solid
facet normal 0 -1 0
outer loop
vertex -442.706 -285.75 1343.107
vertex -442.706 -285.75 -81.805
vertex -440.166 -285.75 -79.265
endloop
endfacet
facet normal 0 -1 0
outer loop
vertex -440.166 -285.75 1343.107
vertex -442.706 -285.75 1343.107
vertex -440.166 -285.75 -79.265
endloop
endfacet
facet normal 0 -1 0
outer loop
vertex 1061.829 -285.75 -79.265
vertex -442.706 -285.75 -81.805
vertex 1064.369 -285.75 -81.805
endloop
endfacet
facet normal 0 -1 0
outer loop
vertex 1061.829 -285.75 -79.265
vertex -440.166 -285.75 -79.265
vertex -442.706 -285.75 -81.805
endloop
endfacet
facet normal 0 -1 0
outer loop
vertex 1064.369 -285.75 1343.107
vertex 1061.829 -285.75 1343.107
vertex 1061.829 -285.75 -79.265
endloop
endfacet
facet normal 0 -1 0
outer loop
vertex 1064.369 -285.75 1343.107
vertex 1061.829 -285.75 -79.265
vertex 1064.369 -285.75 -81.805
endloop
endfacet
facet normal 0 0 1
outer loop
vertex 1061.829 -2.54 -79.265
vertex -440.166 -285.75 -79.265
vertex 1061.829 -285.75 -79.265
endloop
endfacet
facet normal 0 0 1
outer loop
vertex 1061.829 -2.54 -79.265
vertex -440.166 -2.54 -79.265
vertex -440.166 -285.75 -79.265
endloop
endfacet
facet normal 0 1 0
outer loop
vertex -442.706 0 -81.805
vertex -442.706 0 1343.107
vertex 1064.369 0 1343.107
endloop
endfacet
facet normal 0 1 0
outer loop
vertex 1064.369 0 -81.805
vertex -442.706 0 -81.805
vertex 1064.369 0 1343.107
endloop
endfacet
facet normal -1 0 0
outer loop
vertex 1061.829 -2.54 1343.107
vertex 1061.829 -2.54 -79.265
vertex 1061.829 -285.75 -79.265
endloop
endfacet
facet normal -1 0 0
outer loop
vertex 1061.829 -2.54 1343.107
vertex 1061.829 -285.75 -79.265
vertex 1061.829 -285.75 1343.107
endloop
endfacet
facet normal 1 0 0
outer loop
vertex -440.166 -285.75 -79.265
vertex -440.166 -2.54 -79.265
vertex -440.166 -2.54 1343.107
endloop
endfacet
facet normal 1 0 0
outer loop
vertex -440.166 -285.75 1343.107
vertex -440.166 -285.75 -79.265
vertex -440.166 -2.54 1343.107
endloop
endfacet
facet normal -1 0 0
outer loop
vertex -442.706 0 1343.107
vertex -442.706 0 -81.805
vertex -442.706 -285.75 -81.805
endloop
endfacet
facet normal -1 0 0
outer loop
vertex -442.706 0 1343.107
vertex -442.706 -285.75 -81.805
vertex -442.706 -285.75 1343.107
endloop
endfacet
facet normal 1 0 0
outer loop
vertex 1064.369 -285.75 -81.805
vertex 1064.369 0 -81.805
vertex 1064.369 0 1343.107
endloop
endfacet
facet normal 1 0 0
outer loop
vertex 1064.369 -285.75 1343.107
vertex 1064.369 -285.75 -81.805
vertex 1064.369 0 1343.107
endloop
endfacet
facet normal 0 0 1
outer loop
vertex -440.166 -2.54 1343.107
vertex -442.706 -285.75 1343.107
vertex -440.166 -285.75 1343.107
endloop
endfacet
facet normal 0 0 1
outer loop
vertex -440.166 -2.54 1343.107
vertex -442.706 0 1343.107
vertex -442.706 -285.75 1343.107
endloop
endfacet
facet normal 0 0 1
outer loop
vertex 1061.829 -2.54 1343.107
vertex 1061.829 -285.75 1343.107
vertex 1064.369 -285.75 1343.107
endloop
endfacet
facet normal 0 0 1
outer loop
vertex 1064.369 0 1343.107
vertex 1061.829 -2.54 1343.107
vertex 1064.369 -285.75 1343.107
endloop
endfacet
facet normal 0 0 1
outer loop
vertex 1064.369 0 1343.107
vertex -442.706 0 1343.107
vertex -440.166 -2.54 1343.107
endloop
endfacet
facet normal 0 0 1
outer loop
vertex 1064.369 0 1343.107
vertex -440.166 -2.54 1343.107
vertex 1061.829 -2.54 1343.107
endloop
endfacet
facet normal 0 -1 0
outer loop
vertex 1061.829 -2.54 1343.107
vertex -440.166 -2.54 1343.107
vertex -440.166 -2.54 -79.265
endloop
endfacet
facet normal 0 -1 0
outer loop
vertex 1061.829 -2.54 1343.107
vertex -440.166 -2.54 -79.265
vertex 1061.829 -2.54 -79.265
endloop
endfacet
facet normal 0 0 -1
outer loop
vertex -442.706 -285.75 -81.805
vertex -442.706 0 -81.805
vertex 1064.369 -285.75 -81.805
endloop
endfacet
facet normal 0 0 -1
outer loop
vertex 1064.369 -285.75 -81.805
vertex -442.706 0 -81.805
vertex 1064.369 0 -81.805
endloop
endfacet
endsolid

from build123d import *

# Parameters (mm, degrees)
F0_W     = 1507.074781
F0_H     = 1424.91189
F1_DEPTH = 285.75
F2_T     = -2.54


with BuildPart() as f1:
    # F0 (on Front) → F1 (new body)
    with BuildSketch(Plane.XZ):
        with Locations((310.831803, 630.651133)):
            Rectangle(F0_W, F0_H)
    extrude(amount=F1_DEPTH)

    # F2
    f2_openings = [f1.faces().sort_by_distance(p)[0] for p in [
        (310.831804, -285.75, 630.651133),
        (310.831804, -142.875, 1343.107078),
    ]]
    offset(amount=F2_T, openings=f2_openings)


solid = f1.part
